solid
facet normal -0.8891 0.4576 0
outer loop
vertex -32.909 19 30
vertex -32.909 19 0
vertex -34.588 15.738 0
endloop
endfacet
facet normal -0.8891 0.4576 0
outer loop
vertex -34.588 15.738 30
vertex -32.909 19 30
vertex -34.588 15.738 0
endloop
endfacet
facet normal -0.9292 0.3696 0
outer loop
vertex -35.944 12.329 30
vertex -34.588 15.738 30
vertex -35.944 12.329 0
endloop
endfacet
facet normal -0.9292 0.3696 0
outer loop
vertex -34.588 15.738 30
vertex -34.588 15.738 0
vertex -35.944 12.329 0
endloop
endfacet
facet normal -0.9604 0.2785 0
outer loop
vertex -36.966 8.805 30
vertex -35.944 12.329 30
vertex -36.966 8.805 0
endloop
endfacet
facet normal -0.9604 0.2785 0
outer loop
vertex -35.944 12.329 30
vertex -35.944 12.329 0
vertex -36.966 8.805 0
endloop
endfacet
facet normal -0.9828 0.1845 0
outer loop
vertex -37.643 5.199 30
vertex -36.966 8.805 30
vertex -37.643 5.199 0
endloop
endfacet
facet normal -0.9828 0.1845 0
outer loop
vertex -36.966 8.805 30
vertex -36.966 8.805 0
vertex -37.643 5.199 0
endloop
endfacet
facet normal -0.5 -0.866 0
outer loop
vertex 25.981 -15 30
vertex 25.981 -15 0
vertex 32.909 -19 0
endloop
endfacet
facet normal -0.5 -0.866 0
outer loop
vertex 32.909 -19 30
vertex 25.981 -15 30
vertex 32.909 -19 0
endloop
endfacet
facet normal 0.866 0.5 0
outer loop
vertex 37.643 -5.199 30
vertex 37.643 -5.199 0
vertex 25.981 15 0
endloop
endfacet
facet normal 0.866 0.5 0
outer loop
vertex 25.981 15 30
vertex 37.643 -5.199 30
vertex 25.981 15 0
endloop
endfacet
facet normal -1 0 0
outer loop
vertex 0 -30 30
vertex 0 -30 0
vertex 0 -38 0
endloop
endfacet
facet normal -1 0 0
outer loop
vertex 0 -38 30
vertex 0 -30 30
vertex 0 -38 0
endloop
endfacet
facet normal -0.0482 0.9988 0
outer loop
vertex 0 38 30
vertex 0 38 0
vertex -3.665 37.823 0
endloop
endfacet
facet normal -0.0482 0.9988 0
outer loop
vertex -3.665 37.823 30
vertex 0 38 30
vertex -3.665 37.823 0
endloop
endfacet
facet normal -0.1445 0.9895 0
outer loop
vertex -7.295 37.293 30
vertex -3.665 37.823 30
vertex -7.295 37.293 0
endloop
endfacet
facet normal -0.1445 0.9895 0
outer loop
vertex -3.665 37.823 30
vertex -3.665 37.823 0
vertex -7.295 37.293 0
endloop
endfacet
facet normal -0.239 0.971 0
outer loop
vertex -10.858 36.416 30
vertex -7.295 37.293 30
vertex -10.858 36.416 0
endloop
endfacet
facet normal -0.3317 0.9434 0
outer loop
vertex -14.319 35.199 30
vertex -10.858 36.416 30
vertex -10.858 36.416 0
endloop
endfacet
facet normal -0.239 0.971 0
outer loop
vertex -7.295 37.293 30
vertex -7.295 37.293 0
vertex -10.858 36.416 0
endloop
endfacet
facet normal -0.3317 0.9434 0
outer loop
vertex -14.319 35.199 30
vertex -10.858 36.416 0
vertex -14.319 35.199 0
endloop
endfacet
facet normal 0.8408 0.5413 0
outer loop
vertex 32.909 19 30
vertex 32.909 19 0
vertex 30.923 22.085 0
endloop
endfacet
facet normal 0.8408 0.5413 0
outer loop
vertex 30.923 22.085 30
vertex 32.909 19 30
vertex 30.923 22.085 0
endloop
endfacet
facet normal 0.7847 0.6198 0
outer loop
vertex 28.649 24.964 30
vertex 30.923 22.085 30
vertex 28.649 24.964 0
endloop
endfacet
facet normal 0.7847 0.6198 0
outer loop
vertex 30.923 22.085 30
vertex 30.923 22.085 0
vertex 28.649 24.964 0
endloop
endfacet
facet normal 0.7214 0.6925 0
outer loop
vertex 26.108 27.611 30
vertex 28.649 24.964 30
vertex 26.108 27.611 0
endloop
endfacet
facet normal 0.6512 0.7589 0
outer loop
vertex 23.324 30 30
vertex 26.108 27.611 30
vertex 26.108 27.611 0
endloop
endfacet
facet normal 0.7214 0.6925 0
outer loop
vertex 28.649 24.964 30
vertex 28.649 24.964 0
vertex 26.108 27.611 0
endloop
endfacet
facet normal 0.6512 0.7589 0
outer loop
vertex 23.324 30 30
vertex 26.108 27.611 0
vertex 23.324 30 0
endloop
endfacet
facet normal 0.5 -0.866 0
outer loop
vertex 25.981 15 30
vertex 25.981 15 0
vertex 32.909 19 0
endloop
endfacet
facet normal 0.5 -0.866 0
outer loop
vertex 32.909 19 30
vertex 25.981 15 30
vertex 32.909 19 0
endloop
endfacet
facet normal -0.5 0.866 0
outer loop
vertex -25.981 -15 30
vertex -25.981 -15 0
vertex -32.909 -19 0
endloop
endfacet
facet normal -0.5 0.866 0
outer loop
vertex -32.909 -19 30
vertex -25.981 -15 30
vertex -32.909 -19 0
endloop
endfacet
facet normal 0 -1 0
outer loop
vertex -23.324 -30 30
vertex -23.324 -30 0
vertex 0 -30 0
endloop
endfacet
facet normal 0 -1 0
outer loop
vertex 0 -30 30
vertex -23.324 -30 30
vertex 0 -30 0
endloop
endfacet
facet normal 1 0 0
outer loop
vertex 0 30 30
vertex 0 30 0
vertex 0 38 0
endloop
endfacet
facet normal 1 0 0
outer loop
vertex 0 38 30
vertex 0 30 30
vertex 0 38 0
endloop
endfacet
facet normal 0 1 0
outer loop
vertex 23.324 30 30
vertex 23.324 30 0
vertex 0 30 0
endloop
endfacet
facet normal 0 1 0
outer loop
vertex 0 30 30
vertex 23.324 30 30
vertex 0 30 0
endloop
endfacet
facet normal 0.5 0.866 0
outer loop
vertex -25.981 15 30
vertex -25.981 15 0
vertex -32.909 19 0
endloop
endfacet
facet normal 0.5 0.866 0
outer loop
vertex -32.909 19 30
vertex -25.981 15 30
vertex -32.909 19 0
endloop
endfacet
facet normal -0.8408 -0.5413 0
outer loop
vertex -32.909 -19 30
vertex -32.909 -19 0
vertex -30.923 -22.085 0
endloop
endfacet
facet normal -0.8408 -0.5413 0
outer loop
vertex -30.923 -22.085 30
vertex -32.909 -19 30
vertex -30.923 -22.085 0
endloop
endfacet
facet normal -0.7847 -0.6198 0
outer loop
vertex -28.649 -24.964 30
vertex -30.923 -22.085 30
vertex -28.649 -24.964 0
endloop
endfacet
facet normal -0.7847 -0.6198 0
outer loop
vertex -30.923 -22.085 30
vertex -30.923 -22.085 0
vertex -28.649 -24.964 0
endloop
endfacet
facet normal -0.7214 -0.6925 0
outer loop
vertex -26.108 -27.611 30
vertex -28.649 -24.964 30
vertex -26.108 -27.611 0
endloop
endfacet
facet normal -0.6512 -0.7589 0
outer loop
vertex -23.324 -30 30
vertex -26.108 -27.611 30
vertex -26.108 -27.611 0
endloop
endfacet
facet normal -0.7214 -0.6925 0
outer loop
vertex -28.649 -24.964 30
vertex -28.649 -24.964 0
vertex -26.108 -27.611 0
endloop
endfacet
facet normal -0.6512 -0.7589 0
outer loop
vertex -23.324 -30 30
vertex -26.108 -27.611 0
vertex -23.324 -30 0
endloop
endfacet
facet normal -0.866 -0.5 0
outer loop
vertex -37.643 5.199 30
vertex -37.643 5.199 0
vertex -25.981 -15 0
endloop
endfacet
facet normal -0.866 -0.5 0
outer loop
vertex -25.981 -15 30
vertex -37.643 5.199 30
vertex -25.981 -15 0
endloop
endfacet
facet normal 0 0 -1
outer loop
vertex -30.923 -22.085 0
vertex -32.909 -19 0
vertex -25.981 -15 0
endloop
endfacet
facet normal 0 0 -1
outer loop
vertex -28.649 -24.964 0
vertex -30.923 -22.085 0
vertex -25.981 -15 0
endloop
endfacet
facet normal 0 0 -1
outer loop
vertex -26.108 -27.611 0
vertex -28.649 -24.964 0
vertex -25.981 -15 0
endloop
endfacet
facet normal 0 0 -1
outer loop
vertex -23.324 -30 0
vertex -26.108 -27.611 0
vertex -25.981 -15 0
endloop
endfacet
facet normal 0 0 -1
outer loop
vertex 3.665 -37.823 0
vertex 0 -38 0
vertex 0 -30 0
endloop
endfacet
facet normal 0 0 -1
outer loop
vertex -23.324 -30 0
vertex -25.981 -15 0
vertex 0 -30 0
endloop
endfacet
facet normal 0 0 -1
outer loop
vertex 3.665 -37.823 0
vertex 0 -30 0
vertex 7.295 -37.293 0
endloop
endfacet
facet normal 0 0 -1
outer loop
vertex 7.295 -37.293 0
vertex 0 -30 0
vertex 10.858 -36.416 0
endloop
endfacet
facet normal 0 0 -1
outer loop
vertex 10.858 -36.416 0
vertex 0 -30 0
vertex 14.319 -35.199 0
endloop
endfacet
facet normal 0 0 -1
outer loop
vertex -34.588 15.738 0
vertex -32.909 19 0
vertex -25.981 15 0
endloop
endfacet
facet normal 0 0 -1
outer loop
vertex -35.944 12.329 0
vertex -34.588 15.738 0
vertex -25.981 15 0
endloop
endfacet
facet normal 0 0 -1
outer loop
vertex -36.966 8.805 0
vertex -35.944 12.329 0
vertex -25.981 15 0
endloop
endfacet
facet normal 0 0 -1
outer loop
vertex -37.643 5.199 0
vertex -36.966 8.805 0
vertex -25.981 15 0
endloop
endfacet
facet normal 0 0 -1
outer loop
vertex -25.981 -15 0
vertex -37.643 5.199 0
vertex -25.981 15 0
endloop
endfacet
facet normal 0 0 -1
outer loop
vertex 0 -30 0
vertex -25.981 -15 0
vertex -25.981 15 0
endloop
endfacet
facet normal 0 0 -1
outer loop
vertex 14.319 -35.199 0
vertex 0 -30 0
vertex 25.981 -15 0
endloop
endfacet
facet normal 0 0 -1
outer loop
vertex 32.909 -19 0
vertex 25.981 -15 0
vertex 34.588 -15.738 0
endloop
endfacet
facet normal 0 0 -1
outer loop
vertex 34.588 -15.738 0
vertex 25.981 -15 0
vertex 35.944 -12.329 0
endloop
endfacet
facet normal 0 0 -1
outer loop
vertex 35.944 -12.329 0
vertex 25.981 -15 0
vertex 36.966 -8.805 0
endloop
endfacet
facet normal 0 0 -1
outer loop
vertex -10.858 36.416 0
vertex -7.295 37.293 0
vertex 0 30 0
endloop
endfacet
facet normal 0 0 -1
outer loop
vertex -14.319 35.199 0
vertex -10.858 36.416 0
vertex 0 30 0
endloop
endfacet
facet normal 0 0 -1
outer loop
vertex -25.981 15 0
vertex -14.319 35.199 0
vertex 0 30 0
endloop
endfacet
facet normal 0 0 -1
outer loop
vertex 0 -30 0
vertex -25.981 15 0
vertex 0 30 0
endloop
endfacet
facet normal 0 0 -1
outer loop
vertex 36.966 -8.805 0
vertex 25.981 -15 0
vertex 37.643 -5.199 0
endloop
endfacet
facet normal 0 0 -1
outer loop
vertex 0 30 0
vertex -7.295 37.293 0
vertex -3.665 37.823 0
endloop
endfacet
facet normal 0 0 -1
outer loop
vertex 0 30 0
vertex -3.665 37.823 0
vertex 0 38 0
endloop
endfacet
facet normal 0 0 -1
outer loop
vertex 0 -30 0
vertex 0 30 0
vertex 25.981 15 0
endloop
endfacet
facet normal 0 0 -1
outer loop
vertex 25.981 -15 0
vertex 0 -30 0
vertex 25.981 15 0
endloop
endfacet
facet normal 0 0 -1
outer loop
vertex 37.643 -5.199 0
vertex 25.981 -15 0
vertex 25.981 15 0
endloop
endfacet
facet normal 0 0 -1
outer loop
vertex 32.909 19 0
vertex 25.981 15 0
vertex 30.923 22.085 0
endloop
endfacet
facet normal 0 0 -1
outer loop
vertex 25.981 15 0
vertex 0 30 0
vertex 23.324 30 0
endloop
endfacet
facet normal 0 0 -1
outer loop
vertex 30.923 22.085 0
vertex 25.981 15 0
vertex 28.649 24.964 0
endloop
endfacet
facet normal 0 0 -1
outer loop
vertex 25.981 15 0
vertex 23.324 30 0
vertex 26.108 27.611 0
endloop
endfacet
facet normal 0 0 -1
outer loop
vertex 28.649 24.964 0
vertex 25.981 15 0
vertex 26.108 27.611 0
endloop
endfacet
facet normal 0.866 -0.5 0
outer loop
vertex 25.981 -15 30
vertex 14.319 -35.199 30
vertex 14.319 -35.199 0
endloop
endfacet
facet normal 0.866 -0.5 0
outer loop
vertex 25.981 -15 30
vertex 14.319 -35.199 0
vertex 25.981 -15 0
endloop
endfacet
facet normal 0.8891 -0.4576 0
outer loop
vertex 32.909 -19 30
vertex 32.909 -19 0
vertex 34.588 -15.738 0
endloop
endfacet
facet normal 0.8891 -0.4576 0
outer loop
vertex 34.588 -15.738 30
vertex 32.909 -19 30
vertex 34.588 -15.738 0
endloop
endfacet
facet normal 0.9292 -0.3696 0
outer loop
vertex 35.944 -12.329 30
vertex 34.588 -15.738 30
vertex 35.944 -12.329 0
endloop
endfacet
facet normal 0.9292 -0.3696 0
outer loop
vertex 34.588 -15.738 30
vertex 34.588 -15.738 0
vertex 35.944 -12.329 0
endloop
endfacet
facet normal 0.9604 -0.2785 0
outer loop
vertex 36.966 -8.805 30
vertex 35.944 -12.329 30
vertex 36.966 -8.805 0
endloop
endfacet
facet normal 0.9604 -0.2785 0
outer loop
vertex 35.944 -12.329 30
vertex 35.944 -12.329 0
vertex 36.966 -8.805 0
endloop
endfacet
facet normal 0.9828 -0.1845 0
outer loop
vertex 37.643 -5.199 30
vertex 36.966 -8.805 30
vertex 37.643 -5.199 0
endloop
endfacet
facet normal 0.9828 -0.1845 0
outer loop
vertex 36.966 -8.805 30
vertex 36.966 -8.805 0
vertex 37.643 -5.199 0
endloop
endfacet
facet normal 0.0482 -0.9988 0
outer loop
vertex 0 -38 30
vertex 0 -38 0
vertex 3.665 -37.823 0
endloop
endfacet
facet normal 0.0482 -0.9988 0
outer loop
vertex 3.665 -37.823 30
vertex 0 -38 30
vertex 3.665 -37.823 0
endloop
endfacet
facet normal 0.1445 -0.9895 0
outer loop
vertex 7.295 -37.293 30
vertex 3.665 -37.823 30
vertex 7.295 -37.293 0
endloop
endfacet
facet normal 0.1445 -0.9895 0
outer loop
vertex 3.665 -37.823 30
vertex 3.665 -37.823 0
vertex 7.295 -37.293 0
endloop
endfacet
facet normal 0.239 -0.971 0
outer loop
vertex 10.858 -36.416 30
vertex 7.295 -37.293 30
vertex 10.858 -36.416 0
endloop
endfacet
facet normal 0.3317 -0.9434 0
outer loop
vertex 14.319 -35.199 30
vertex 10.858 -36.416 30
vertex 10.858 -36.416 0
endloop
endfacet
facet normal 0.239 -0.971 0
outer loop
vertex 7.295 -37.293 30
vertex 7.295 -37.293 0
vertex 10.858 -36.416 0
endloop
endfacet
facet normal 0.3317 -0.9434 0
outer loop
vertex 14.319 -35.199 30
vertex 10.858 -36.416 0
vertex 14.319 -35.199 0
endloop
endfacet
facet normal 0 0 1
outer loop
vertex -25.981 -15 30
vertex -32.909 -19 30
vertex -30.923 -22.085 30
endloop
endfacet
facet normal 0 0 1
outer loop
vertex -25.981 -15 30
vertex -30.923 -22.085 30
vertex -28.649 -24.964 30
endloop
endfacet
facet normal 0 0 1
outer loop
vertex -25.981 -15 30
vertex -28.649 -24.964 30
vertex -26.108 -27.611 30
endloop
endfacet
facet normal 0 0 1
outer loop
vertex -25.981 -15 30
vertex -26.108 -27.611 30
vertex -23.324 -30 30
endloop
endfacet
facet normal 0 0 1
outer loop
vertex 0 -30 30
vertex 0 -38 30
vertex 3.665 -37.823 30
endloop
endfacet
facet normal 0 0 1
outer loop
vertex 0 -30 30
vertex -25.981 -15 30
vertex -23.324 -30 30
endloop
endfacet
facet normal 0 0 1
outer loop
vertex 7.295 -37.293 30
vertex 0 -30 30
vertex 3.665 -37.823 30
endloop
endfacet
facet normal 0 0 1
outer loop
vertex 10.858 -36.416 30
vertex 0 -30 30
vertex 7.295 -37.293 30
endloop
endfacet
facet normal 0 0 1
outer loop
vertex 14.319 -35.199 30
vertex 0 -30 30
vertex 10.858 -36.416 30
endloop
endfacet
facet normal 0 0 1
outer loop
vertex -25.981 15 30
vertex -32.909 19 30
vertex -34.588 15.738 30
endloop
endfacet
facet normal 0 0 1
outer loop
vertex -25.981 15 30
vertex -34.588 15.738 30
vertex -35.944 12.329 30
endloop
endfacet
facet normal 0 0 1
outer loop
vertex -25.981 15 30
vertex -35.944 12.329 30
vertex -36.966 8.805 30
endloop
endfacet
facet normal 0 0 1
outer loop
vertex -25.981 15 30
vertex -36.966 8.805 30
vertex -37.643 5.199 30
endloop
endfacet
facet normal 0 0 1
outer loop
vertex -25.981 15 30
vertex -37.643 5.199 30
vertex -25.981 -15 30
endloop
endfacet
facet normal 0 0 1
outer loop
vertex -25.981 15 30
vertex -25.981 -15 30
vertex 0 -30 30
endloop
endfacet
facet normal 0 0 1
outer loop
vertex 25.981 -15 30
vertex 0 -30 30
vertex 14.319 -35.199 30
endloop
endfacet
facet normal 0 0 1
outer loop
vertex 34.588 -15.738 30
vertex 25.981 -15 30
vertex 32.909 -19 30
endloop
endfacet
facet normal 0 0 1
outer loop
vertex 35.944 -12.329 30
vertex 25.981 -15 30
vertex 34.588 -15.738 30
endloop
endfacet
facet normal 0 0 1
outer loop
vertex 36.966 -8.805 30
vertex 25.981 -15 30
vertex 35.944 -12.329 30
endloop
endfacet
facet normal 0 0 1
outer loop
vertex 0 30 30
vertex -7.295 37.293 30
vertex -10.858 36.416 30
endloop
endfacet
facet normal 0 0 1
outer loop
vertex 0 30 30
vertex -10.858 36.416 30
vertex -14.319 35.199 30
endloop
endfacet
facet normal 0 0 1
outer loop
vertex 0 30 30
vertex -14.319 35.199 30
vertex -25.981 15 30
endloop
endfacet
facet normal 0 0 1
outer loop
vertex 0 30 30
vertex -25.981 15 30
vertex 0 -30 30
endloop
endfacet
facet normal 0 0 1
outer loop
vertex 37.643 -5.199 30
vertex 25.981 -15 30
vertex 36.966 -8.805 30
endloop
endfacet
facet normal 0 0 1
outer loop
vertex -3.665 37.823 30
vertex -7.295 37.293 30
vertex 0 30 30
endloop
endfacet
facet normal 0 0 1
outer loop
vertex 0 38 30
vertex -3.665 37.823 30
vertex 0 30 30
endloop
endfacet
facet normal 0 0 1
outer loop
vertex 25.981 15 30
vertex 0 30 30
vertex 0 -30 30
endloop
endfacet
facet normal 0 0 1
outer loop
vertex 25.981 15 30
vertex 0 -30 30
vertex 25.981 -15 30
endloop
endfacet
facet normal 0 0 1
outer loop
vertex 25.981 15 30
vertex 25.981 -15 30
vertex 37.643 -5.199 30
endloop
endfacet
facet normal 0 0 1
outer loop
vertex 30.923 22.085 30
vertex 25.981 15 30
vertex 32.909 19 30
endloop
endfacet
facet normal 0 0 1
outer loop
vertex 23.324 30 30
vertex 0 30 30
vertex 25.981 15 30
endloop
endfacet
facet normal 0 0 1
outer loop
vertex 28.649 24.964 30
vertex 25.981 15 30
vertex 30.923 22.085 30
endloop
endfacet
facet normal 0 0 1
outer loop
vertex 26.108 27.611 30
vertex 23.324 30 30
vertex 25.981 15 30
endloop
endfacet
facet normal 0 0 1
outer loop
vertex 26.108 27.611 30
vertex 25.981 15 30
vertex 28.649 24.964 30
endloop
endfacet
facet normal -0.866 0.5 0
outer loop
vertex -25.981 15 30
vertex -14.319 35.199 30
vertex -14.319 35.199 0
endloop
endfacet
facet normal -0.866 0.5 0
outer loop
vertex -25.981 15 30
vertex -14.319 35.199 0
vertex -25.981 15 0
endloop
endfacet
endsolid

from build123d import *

# Parameters (mm, degrees)
SKETCH1_R           = 30
BOSS_EXTRUDE1_DEPTH = 30


with BuildPart() as part:
    # Sketch1 → Boss-Extrude1 (new body)
    with BuildSketch(Plane.XY):
        with BuildLine():
            ThreePointArc((-25.980762114, 15), (-15, 25.980762114), (0, 30))
            Line((0, 30), (0, 38))
            ThreePointArc((0, 38), (-7.295122504, 37.293178836), (-14.318858324, 35.199009877))
            Line((-14.318858324, 35.199009877), (-25.980762114, 15))
        make_face()
        with BuildLine():
            ThreePointArc((-25.980762114, -15), (-30, 0), (-25.980762114, 15))
            Line((-25.980762114, 15), (-32.908965344, 19))
            ThreePointArc((-32.908965344, 19), (-35.944401511, 12.328828006), (-37.642665903, 5.199009877))
            Line((-37.642665903, 5.199009877), (-25.980762114, -15))
        make_face()
        with BuildLine():
            ThreePointArc((0, -30), (-15, -25.980762114), (-25.980762114, -15))
            Line((-25.980762114, -15), (-32.908965344, -19))
            ThreePointArc((-32.908965344, -19), (-28.649279008, -24.96435083), (-23.323807579, -30))
            Line((-23.323807579, -30), (0, -30))
        make_face()
        with BuildLine():
            Line((14.318858324, -35.199009877), (25.980762114, -15))
            ThreePointArc((25.980762114, -15), (15, -25.980762114), (0, -30))
            Line((0, -30), (0, -38))
            ThreePointArc((0, -38), (7.295122504, -37.293178836), (14.318858324, -35.199009877))
        make_face()
        with BuildLine():
            Line((37.642665903, -5.199009877), (25.980762114, 15))
            ThreePointArc((25.980762114, 15), (28.977774789, 7.764571353), (30, 0))
            ThreePointArc((30, 0), (28.977774789, -7.764571353), (25.980762114, -15))
            Line((25.980762114, -15), (32.908965344, -19))
            ThreePointArc((32.908965344, -19), (35.944401511, -12.328828006), (37.642665903, -5.199009877))
        make_face()
        with BuildLine():
            Line((8.246211251, 30), (0, 30))
            ThreePointArc((0, 30), (15, 25.980762114), (25.980762114, 15))
            Line((25.980762114, 15), (32.908965344, 19))
            ThreePointArc((32.908965344, 19), (28.649279008, 24.96435083), (23.323807579, 30))
            Line((23.323807579, 30), (8.246211251, 30))
        make_face()
        Circle(SKETCH1_R)
    extrude(amount=BOSS_EXTRUDE1_DEPTH)


solid = part.part
